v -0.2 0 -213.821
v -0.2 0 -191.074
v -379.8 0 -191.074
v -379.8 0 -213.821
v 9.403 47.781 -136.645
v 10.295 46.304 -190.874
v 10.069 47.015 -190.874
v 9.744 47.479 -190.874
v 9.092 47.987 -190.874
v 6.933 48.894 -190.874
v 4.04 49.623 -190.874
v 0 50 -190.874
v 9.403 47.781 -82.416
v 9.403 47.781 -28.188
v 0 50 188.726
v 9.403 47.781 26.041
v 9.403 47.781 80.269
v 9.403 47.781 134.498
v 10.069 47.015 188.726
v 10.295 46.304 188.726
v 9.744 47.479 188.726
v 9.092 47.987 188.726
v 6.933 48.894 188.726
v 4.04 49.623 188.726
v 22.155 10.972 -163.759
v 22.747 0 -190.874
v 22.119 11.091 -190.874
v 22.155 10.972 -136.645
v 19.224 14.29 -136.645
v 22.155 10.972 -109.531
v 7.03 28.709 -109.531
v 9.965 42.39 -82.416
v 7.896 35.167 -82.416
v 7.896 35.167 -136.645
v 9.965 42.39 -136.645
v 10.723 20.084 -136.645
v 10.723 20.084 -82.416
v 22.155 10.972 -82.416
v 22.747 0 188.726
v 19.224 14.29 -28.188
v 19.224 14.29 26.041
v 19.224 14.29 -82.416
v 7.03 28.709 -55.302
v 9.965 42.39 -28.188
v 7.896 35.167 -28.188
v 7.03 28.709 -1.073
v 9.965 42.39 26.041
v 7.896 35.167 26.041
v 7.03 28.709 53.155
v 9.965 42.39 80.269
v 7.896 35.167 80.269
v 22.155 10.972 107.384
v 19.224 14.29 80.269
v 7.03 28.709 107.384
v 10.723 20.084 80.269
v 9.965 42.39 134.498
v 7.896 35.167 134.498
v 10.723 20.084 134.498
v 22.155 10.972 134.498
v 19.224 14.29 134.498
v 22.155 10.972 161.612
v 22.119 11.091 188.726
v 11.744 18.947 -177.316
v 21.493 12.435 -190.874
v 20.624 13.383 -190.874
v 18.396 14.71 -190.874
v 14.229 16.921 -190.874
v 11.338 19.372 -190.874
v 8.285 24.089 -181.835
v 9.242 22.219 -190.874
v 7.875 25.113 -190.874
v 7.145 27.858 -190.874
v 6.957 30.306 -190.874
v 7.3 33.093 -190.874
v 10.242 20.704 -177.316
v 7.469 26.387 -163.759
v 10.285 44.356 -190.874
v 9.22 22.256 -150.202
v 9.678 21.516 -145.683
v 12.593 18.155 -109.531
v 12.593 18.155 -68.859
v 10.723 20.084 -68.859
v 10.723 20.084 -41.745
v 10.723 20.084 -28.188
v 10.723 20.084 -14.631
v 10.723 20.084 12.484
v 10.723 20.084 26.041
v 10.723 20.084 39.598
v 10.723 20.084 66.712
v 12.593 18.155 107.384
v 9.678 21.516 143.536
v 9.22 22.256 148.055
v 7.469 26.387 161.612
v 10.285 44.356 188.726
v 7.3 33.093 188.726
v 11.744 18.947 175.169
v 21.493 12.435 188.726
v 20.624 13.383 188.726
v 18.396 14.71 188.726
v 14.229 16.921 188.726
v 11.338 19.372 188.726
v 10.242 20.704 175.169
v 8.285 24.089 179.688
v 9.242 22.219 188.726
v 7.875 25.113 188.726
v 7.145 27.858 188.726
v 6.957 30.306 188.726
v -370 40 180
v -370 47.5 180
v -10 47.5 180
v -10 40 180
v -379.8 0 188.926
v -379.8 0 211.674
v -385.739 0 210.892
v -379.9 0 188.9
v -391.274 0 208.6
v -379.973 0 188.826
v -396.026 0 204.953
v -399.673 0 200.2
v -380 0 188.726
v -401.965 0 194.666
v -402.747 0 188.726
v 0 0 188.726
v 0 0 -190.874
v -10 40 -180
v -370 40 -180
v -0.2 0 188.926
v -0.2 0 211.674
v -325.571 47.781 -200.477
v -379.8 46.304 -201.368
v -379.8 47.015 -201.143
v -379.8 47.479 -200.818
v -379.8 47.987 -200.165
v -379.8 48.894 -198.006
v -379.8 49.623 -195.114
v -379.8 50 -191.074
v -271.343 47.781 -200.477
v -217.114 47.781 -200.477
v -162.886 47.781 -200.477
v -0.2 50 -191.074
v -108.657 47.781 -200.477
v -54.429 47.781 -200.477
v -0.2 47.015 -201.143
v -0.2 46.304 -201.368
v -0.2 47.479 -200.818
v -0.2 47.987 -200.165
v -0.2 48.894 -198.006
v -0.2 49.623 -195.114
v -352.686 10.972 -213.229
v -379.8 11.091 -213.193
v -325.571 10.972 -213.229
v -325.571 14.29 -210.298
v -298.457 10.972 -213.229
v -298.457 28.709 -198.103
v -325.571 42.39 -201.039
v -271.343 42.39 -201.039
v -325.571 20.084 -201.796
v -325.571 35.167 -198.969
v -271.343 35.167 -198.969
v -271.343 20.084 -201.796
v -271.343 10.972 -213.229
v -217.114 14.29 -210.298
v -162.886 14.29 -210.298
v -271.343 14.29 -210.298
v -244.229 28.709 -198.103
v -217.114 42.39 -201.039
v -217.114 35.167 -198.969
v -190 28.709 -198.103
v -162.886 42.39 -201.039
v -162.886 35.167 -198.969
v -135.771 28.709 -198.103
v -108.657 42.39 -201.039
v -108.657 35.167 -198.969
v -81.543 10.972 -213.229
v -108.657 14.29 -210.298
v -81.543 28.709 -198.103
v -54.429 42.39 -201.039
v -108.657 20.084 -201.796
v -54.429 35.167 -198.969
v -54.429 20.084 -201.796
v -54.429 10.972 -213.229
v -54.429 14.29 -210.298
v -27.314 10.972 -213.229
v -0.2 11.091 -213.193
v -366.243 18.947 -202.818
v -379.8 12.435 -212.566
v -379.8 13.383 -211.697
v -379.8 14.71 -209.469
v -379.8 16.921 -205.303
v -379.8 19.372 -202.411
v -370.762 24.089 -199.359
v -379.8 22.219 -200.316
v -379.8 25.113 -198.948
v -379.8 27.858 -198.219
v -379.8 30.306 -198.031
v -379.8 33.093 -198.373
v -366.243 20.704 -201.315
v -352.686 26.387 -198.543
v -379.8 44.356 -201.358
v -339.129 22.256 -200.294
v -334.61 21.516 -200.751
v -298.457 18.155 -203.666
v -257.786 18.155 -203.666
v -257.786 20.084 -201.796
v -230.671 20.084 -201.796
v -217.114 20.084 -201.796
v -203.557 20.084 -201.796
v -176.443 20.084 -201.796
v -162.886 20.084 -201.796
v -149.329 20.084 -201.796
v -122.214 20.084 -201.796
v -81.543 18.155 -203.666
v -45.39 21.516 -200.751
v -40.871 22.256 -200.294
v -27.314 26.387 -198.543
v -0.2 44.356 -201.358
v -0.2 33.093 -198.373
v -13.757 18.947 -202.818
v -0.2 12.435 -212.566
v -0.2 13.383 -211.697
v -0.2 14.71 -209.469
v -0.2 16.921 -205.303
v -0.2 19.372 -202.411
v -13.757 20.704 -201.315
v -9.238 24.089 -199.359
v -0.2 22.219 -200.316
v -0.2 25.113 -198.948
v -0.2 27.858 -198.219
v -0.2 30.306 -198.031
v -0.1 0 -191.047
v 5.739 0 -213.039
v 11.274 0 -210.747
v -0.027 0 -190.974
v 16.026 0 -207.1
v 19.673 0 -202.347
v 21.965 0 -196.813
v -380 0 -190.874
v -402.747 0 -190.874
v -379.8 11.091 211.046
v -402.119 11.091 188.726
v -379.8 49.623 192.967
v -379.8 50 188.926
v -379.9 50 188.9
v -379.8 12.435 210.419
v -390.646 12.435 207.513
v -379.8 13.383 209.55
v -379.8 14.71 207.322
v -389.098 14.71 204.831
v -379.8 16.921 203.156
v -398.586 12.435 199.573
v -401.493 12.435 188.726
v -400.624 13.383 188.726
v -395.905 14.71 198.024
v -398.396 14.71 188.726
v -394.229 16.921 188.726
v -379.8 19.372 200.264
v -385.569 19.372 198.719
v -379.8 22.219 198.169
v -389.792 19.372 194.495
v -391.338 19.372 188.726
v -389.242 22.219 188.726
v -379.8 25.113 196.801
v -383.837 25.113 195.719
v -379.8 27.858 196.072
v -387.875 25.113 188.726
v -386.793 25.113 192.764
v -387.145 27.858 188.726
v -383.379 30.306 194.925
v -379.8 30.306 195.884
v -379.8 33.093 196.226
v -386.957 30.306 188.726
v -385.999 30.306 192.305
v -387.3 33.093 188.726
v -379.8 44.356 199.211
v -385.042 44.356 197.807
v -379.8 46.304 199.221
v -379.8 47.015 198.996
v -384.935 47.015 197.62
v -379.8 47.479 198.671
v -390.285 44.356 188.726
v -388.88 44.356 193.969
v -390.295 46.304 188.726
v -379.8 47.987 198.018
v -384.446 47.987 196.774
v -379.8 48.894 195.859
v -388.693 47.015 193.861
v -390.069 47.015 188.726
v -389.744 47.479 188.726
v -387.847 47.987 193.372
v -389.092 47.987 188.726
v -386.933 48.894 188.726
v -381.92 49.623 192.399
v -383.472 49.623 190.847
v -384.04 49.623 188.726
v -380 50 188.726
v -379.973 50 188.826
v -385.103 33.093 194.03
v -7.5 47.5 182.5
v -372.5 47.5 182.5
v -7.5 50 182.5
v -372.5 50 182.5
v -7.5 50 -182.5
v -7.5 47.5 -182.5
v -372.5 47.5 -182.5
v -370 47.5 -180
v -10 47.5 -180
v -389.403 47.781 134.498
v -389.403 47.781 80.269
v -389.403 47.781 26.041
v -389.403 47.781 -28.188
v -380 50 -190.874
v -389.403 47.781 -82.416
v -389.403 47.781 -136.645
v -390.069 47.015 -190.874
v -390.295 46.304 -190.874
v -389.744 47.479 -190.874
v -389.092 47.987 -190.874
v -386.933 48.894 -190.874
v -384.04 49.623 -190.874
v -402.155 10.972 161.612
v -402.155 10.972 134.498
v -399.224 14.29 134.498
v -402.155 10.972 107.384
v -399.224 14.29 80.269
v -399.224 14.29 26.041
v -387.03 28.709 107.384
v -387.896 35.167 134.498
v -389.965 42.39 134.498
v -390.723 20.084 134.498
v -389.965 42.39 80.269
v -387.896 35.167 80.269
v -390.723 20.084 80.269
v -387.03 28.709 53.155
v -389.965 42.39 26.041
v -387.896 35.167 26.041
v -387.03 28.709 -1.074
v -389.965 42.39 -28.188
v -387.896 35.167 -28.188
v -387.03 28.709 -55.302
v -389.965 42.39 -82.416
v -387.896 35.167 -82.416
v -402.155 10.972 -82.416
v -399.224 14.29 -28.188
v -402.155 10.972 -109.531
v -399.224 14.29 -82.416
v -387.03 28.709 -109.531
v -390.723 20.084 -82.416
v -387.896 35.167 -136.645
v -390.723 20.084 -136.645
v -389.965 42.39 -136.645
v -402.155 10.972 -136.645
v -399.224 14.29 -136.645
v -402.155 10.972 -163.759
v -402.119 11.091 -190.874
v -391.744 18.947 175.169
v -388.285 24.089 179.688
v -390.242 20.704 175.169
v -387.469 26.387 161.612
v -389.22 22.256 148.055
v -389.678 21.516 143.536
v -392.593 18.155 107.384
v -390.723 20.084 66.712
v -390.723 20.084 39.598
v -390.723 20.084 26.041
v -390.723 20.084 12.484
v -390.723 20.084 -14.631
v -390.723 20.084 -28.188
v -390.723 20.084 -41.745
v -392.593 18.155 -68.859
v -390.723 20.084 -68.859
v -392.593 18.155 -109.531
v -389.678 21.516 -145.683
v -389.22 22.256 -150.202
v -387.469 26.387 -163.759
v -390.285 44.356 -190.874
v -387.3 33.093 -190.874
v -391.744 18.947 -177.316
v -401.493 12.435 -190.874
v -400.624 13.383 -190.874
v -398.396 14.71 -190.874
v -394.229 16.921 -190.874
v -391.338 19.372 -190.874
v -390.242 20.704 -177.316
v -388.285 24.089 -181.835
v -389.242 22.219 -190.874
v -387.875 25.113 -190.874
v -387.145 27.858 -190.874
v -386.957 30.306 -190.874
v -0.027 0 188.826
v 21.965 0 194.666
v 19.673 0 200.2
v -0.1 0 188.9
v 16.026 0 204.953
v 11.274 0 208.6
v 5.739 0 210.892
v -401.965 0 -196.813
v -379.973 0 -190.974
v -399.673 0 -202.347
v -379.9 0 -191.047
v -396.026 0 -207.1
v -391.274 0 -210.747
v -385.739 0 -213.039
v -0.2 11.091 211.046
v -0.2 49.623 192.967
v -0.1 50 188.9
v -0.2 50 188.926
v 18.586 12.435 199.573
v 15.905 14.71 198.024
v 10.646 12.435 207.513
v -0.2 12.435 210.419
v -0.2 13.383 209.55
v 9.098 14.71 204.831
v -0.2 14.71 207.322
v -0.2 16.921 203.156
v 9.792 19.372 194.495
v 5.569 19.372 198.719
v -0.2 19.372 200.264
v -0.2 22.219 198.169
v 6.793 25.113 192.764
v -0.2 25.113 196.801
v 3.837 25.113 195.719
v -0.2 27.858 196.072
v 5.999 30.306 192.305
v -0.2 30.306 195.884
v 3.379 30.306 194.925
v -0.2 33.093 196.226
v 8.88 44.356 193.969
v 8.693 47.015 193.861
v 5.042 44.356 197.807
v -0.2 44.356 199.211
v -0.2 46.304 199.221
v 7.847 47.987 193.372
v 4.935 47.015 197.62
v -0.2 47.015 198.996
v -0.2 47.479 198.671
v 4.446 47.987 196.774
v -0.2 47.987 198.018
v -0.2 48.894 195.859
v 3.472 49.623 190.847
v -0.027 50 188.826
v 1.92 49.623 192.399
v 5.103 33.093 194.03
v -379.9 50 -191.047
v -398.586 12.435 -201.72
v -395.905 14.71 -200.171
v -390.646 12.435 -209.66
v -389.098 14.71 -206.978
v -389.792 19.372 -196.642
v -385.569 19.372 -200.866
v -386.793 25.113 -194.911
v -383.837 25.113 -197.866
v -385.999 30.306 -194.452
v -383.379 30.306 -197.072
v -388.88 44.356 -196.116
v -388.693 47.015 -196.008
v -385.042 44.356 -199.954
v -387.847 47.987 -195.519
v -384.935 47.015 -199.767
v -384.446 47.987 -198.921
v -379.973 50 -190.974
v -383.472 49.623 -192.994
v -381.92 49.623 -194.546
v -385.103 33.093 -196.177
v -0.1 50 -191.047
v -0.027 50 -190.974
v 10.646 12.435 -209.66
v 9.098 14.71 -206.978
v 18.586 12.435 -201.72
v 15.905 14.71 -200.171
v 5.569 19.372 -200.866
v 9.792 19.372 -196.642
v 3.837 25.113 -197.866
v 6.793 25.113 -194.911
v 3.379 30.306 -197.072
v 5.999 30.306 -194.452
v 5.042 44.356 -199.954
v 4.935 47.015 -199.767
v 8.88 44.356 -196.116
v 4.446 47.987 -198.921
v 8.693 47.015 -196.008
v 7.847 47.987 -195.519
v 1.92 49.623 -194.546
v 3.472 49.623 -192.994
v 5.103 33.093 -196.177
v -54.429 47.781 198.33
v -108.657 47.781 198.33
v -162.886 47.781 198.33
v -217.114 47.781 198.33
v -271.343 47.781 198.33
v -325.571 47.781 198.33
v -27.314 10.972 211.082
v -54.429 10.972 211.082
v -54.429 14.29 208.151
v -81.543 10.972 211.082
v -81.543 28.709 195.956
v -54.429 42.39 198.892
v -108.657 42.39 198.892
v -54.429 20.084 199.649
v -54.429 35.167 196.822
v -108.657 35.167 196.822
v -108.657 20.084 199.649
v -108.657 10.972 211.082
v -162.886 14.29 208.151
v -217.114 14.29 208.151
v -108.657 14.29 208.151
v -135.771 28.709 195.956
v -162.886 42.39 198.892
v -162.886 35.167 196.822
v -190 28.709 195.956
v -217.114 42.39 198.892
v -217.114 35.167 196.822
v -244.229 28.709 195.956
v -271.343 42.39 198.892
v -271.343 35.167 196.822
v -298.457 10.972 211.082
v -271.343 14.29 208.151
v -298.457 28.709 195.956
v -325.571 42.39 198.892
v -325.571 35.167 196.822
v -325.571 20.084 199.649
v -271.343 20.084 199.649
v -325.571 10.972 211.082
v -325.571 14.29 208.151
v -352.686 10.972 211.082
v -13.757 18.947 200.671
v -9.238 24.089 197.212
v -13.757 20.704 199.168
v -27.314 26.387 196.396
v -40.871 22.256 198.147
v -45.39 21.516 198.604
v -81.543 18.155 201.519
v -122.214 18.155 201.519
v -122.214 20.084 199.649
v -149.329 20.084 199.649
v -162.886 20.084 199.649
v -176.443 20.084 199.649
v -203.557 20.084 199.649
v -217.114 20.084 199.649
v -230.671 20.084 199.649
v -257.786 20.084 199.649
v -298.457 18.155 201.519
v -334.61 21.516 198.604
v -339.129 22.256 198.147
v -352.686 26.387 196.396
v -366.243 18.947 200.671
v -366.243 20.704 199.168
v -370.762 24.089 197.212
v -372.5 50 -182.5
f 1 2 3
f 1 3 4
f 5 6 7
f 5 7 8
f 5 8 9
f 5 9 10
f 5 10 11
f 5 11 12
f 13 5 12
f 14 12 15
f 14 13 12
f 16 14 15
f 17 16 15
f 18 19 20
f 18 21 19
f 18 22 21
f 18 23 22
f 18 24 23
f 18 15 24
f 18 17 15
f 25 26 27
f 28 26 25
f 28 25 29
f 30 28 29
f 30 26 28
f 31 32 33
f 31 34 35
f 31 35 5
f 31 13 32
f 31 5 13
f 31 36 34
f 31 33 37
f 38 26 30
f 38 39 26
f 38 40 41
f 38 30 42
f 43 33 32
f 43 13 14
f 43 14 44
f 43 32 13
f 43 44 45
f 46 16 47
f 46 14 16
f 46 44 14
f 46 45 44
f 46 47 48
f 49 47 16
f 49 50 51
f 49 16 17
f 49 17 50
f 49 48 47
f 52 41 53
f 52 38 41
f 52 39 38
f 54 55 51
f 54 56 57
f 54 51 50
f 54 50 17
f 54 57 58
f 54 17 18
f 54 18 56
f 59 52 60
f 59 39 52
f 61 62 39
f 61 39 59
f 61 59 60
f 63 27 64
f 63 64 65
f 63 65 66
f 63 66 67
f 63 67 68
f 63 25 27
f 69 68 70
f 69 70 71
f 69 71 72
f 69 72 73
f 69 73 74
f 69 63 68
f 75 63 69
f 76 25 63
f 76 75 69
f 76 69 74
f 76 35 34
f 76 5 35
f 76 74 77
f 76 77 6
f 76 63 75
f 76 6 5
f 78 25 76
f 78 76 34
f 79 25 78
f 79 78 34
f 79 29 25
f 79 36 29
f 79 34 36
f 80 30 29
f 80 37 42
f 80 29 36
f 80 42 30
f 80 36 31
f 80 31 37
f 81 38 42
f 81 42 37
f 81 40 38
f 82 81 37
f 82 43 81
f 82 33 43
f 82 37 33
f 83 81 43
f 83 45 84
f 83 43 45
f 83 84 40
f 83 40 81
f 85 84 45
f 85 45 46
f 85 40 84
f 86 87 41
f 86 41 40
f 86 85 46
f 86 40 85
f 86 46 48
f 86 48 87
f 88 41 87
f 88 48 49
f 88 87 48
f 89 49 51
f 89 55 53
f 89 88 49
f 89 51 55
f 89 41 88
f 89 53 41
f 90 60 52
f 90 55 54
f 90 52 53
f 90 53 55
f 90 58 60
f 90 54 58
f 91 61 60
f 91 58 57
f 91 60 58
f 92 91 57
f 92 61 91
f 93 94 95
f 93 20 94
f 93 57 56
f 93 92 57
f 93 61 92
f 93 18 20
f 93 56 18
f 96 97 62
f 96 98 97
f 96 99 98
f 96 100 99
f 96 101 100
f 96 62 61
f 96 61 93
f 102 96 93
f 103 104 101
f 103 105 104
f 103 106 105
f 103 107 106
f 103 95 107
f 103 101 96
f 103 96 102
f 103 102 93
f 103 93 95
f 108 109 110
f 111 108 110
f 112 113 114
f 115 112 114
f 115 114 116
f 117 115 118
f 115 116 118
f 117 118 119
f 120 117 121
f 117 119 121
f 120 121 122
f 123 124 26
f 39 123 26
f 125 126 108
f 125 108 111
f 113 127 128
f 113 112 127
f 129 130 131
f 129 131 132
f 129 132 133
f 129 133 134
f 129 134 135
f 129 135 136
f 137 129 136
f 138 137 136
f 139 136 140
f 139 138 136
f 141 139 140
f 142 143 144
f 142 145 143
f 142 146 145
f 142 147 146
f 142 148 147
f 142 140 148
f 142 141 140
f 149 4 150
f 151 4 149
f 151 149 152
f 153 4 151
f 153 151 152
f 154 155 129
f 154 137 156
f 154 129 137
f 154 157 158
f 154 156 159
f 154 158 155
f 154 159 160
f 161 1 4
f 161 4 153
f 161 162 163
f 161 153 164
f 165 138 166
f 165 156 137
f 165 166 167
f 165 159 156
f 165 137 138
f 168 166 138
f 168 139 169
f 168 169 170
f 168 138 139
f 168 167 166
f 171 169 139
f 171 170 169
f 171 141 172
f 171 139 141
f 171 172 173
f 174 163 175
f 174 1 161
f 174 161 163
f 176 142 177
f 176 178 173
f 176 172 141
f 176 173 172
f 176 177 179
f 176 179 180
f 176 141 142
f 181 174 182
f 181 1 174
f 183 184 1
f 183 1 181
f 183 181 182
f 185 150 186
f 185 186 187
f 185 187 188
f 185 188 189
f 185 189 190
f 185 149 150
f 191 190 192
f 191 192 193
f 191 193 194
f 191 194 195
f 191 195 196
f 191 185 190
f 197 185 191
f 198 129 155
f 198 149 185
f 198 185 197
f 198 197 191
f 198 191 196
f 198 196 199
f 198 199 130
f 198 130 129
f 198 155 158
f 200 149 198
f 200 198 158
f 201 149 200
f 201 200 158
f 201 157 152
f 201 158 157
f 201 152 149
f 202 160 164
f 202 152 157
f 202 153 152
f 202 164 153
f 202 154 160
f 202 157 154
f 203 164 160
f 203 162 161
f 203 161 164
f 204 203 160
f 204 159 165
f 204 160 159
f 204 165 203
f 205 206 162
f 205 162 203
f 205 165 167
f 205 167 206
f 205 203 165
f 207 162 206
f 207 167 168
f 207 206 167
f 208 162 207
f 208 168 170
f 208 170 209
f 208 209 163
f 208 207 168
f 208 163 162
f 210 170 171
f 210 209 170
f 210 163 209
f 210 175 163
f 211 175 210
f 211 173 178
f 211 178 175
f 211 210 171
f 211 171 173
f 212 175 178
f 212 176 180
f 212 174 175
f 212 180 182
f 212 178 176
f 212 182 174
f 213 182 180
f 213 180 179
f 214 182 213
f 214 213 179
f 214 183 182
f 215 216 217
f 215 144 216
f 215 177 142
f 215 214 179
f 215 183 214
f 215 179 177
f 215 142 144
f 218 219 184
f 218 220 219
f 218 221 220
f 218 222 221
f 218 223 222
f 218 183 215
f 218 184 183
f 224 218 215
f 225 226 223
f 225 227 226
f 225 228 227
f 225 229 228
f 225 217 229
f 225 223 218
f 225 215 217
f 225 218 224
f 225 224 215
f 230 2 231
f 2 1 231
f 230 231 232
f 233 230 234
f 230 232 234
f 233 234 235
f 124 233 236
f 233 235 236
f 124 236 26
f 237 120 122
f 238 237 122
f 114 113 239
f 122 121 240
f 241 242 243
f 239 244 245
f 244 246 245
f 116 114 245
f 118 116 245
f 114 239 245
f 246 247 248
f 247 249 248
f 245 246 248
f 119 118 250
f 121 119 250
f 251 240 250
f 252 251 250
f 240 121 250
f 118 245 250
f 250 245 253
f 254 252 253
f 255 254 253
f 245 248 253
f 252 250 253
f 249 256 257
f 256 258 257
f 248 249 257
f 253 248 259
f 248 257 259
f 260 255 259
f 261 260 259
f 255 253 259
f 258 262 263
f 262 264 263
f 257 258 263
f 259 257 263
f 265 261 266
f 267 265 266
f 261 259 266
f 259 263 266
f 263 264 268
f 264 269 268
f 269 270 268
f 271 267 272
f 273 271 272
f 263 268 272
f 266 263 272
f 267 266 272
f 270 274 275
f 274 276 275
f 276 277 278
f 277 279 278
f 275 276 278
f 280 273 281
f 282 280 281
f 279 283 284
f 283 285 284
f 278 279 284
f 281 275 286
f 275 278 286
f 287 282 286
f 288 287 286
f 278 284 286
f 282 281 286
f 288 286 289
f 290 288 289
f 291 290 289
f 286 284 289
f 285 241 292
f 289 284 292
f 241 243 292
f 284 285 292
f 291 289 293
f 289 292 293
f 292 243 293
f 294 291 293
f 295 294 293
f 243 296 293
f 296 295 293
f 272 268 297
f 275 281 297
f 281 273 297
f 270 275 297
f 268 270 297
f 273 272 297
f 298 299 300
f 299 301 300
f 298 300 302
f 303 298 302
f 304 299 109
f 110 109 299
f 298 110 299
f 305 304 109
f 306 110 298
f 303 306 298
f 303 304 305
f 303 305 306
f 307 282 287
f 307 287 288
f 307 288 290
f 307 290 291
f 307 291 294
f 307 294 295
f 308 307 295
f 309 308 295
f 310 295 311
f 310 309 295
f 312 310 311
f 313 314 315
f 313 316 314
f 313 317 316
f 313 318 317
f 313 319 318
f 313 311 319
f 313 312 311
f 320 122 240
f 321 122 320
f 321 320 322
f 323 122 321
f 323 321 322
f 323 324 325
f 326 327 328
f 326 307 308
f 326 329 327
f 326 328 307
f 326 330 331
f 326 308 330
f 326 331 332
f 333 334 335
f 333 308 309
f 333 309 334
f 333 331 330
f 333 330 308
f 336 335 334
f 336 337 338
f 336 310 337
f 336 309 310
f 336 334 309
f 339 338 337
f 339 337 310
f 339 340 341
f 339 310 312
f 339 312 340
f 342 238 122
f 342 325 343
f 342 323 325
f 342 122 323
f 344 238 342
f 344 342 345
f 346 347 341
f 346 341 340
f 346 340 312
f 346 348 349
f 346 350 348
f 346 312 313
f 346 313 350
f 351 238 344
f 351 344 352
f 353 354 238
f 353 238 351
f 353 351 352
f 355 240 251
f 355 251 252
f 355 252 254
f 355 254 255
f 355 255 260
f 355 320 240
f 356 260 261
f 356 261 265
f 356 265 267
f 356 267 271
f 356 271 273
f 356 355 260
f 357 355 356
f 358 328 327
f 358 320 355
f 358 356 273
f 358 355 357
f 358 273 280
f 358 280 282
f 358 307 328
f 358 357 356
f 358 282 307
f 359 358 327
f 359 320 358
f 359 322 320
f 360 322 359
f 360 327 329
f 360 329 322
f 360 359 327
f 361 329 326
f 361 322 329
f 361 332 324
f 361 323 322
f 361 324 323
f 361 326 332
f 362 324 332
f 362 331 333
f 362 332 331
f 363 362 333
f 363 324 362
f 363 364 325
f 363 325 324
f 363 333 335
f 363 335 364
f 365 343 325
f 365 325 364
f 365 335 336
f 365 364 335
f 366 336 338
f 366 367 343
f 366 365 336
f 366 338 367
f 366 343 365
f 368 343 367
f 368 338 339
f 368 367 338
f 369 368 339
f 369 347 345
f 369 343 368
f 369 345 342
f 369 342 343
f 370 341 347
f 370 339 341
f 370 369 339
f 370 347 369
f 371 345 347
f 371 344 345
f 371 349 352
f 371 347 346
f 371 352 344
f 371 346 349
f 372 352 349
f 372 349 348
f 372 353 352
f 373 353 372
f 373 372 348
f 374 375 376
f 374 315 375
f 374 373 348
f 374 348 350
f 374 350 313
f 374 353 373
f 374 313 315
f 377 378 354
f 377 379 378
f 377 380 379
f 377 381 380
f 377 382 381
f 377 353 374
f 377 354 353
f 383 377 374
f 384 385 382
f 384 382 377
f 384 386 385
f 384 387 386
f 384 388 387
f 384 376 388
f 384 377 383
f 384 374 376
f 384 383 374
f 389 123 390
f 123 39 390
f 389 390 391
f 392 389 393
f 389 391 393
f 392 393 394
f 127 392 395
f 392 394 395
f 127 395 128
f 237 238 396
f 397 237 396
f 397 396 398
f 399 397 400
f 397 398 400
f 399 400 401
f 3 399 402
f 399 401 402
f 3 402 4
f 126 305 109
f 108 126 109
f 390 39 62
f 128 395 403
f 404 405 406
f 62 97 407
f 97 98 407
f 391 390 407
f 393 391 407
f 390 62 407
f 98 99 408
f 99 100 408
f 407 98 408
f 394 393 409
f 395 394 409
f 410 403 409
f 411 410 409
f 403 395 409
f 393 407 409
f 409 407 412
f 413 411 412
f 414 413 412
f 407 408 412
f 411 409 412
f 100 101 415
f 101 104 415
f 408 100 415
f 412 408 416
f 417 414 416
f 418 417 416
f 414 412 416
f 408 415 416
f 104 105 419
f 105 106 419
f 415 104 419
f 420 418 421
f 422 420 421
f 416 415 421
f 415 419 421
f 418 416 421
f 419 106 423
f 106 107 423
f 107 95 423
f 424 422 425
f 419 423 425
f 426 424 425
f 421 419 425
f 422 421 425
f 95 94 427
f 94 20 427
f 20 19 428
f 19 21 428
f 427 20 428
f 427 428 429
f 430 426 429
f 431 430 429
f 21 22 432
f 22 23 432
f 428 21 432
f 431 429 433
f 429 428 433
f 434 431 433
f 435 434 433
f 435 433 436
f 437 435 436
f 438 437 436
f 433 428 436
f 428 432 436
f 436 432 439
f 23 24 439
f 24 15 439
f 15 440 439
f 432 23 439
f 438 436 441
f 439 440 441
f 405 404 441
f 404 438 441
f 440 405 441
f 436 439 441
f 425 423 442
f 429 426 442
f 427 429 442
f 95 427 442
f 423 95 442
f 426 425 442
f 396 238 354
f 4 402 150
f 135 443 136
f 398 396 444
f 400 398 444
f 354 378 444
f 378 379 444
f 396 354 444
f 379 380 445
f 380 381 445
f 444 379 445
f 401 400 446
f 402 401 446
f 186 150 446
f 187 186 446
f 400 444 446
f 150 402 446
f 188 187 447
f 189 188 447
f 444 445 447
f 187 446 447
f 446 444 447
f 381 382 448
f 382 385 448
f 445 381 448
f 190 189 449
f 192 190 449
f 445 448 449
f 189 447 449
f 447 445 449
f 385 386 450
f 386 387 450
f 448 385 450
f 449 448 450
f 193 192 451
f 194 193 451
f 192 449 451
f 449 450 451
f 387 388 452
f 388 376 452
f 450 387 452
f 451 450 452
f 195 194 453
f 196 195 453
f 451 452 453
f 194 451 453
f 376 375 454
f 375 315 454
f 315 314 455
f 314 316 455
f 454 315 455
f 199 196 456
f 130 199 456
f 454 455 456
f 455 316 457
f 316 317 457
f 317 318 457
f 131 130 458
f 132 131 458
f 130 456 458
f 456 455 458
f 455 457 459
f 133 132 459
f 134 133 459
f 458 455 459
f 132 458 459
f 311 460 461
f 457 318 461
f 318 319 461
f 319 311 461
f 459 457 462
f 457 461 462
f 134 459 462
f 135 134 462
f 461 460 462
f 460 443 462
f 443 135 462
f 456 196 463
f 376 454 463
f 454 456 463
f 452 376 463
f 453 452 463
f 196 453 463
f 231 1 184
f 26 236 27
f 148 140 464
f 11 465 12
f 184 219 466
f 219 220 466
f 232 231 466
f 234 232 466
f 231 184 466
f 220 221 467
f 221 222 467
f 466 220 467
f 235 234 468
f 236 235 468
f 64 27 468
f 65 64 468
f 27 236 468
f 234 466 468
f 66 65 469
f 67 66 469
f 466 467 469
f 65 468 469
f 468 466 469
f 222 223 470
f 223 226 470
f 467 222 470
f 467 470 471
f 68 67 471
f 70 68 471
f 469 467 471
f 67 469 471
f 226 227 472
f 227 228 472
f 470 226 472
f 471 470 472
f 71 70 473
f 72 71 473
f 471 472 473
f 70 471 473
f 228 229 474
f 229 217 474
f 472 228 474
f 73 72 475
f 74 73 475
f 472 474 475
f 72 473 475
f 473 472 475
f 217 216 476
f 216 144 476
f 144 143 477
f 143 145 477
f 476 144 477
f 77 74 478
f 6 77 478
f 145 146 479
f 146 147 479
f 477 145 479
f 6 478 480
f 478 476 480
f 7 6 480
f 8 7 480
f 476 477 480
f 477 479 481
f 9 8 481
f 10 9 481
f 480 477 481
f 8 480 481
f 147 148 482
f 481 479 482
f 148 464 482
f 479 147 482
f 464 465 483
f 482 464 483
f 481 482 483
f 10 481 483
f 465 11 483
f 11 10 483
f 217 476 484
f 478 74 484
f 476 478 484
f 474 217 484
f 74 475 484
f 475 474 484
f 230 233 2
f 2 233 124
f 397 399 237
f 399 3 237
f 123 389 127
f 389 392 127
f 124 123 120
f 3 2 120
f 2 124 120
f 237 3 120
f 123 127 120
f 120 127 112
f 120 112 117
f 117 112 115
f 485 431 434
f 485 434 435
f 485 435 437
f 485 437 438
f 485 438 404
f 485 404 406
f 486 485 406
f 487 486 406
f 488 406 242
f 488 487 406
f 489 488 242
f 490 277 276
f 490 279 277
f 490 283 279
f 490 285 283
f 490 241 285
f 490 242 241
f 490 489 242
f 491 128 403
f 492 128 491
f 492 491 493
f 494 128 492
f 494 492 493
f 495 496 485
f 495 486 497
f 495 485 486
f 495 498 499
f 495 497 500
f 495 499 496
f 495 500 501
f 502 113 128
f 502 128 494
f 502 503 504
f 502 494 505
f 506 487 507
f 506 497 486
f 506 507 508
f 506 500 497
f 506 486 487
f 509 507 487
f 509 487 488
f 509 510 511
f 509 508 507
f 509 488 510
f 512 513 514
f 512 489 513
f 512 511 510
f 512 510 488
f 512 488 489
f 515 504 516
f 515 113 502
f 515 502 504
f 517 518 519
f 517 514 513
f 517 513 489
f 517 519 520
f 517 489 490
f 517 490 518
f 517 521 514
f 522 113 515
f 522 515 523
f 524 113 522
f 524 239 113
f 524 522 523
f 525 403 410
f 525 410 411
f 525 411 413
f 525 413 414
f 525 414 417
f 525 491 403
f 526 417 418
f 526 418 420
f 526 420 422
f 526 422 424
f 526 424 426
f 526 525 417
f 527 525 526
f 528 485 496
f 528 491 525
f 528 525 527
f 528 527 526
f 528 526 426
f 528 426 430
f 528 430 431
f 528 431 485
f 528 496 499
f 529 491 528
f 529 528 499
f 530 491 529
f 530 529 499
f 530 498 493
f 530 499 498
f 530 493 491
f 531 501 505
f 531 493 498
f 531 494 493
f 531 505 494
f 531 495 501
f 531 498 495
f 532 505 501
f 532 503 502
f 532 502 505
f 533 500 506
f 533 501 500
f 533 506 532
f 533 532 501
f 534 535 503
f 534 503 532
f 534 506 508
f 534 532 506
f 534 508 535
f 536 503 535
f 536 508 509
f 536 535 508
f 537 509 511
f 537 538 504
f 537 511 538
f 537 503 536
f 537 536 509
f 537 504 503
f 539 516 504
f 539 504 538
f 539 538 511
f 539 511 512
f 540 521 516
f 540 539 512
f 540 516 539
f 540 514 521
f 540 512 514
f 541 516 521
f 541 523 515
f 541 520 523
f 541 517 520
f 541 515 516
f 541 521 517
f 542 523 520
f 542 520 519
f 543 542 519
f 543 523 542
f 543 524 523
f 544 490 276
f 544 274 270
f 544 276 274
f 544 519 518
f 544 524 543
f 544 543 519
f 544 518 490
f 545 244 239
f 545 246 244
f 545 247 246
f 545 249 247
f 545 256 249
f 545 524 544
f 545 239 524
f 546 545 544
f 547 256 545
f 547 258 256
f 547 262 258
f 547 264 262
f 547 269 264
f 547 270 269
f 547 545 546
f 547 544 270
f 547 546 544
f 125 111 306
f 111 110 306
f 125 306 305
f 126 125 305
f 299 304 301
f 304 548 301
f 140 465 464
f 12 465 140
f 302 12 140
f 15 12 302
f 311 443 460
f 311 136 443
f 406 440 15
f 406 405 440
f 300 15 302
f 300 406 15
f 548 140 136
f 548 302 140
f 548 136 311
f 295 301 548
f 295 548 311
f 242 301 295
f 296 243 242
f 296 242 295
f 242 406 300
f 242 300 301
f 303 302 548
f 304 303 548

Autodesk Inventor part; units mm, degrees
ref_plane "YZ Plane" through (0, 0, 0) normal (1, 0, 0) x (0, 1, 0)
ref_plane "XZ Plane" through (0, 0, 0) normal (0, 1, 0) x (-1, 0, 0)
ref_plane "XY Plane" through (0, 0, 0) normal (0, 0, 1) x (1, 0, 0)
sketch "Sketch2" plane through (0, 0, 0) normal (0, 1, 0) x (-1, 0, 0)
  line L0 (0.2, 188.9265) -> (379.8, 188.9265)
  line L1 (380, 188.7265) -> (380, -190.8735)
  line L2 (379.8, -191.0735) -> (0.2, -191.0735)
  line L3 (0, -190.8735) -> (0, 188.7265)
  arc A0 (0.2, 188.9265) -> (0, 188.7265) centre (0.2, 188.7265) ccw
  arc A1 (0, -190.8735) -> (0.2, -191.0735) centre (0.2, -190.8735) ccw
  arc A2 (379.8, -191.0735) -> (380, -190.8735) centre (379.8, -190.8735) ccw
  arc A3 (380, 188.7265) -> (379.8, 188.9265) centre (379.8, 188.7265) ccw
  point P0 (0, 0)
  point P1 (380, -191.0735)
  point P2 (380, 188.9265)
  point P3 (0, -191.0735)
  dimension "d1" = 380
  dimension "d2" = 380
  dimension "d3" = 0.2
sketch "Sketch1" plane through (0, 0, 0) normal (0, 0, 1) x (1, 0, 0)
  line L0 (0, 0) -> (0, 50)
  line L1 (0, 50) -> (4.0204, 50) construction
  line L2 (4.0204, 50) -> (9.5242, 47.979) construction
  line L3 (9.5242, 47.979) -> (11.3737, 47.979) construction
  line L4 (11.3737, 47.979) -> (8.9562, 37.1523) construction
  line L5 (8.9562, 37.1523) -> (6.6334, 32.9423) construction
  line L6 (6.6334, 32.9423) -> (6.6334, 25) construction
  line L7 (6.6334, 25) -> (13.82, 14.5057) construction
  line L8 (13.82, 14.5057) -> (22.7474, 14.5057) construction
  line L9 (22.7474, 14.5057) -> (22.7474, 9.2795) construction
  line L10 (22.7474, 9.2795) -> (22.7474, 0) construction
  spline S0 degree 4 poles (0, 50) (4.0204, 50) (9.5242, 47.979) (11.3737, 47.979) (8.9562, 37.1523) (6.6334, 32.9423) (6.6334, 25) (13.82, 14.5057) (22.7474, 14.5057) (22.7474, 9.2795) (22.7474, 0) knots 1 1 1 1 1 2 3 4 5 6 7 8 8 8 8 8
  line L11 (0, 0) -> (22.7474, 0)
  dimension "d0" = 50
sweep "Sweep1" add profiles "Sketch1" path "Sketch2"
extrude "Extrusion1" add sketch "Sketch2" along normal blind 50
sketch "Sketch3" plane through (0, 50, 0) normal (0, 1, 0) x (1, 0, 0)
  line L0 (-370, -180) -> (-10, -180)
  line L1 (-10, -180) -> (-10, 180)
  line L2 (-10, 180) -> (-370, 180)
  line L3 (-370, 180) -> (-370, -180)
  line L4 (-370, -180) -> (-10, 180) construction
  line L5 (-10, -180) -> (-370, 180) construction
  point P0 (0, 0)
  point P1 (-190, 0)
  dimension "d8" = 360
  dimension "d9" = 360
extrude "Extrusion2" cut sketch "Sketch3" against normal blind 10
sketch "Sketch4" plane through (0, 50, 0) normal (0, 1, 0) x (1, 0, 0)
  line L0 (-370, -180) -> (-370, 180) projected
  line L1 (-370, 0) -> (-10, 0)
  line L2 (-10, 180) -> (-10, -180) projected
  line L3 (-372.5, -182.5) -> (-7.5, -182.5)
  line L4 (-7.5, -182.5) -> (-7.5, 182.5)
  line L5 (-7.5, 182.5) -> (-372.5, 182.5)
  line L6 (-372.5, 182.5) -> (-372.5, -182.5)
  line L7 (-372.5, -182.5) -> (-7.5, 182.5) construction
  line L8 (-7.5, -182.5) -> (-372.5, 182.5) construction
  point P0 (0, 0)
  point P1 (-190, 0)
  dimension "d12" = 365
  dimension "d13" = 365
extrude "Extrusion3" cut sketch "Sketch4" against normal blind 2.5
properties part number "Board Piece 2"
